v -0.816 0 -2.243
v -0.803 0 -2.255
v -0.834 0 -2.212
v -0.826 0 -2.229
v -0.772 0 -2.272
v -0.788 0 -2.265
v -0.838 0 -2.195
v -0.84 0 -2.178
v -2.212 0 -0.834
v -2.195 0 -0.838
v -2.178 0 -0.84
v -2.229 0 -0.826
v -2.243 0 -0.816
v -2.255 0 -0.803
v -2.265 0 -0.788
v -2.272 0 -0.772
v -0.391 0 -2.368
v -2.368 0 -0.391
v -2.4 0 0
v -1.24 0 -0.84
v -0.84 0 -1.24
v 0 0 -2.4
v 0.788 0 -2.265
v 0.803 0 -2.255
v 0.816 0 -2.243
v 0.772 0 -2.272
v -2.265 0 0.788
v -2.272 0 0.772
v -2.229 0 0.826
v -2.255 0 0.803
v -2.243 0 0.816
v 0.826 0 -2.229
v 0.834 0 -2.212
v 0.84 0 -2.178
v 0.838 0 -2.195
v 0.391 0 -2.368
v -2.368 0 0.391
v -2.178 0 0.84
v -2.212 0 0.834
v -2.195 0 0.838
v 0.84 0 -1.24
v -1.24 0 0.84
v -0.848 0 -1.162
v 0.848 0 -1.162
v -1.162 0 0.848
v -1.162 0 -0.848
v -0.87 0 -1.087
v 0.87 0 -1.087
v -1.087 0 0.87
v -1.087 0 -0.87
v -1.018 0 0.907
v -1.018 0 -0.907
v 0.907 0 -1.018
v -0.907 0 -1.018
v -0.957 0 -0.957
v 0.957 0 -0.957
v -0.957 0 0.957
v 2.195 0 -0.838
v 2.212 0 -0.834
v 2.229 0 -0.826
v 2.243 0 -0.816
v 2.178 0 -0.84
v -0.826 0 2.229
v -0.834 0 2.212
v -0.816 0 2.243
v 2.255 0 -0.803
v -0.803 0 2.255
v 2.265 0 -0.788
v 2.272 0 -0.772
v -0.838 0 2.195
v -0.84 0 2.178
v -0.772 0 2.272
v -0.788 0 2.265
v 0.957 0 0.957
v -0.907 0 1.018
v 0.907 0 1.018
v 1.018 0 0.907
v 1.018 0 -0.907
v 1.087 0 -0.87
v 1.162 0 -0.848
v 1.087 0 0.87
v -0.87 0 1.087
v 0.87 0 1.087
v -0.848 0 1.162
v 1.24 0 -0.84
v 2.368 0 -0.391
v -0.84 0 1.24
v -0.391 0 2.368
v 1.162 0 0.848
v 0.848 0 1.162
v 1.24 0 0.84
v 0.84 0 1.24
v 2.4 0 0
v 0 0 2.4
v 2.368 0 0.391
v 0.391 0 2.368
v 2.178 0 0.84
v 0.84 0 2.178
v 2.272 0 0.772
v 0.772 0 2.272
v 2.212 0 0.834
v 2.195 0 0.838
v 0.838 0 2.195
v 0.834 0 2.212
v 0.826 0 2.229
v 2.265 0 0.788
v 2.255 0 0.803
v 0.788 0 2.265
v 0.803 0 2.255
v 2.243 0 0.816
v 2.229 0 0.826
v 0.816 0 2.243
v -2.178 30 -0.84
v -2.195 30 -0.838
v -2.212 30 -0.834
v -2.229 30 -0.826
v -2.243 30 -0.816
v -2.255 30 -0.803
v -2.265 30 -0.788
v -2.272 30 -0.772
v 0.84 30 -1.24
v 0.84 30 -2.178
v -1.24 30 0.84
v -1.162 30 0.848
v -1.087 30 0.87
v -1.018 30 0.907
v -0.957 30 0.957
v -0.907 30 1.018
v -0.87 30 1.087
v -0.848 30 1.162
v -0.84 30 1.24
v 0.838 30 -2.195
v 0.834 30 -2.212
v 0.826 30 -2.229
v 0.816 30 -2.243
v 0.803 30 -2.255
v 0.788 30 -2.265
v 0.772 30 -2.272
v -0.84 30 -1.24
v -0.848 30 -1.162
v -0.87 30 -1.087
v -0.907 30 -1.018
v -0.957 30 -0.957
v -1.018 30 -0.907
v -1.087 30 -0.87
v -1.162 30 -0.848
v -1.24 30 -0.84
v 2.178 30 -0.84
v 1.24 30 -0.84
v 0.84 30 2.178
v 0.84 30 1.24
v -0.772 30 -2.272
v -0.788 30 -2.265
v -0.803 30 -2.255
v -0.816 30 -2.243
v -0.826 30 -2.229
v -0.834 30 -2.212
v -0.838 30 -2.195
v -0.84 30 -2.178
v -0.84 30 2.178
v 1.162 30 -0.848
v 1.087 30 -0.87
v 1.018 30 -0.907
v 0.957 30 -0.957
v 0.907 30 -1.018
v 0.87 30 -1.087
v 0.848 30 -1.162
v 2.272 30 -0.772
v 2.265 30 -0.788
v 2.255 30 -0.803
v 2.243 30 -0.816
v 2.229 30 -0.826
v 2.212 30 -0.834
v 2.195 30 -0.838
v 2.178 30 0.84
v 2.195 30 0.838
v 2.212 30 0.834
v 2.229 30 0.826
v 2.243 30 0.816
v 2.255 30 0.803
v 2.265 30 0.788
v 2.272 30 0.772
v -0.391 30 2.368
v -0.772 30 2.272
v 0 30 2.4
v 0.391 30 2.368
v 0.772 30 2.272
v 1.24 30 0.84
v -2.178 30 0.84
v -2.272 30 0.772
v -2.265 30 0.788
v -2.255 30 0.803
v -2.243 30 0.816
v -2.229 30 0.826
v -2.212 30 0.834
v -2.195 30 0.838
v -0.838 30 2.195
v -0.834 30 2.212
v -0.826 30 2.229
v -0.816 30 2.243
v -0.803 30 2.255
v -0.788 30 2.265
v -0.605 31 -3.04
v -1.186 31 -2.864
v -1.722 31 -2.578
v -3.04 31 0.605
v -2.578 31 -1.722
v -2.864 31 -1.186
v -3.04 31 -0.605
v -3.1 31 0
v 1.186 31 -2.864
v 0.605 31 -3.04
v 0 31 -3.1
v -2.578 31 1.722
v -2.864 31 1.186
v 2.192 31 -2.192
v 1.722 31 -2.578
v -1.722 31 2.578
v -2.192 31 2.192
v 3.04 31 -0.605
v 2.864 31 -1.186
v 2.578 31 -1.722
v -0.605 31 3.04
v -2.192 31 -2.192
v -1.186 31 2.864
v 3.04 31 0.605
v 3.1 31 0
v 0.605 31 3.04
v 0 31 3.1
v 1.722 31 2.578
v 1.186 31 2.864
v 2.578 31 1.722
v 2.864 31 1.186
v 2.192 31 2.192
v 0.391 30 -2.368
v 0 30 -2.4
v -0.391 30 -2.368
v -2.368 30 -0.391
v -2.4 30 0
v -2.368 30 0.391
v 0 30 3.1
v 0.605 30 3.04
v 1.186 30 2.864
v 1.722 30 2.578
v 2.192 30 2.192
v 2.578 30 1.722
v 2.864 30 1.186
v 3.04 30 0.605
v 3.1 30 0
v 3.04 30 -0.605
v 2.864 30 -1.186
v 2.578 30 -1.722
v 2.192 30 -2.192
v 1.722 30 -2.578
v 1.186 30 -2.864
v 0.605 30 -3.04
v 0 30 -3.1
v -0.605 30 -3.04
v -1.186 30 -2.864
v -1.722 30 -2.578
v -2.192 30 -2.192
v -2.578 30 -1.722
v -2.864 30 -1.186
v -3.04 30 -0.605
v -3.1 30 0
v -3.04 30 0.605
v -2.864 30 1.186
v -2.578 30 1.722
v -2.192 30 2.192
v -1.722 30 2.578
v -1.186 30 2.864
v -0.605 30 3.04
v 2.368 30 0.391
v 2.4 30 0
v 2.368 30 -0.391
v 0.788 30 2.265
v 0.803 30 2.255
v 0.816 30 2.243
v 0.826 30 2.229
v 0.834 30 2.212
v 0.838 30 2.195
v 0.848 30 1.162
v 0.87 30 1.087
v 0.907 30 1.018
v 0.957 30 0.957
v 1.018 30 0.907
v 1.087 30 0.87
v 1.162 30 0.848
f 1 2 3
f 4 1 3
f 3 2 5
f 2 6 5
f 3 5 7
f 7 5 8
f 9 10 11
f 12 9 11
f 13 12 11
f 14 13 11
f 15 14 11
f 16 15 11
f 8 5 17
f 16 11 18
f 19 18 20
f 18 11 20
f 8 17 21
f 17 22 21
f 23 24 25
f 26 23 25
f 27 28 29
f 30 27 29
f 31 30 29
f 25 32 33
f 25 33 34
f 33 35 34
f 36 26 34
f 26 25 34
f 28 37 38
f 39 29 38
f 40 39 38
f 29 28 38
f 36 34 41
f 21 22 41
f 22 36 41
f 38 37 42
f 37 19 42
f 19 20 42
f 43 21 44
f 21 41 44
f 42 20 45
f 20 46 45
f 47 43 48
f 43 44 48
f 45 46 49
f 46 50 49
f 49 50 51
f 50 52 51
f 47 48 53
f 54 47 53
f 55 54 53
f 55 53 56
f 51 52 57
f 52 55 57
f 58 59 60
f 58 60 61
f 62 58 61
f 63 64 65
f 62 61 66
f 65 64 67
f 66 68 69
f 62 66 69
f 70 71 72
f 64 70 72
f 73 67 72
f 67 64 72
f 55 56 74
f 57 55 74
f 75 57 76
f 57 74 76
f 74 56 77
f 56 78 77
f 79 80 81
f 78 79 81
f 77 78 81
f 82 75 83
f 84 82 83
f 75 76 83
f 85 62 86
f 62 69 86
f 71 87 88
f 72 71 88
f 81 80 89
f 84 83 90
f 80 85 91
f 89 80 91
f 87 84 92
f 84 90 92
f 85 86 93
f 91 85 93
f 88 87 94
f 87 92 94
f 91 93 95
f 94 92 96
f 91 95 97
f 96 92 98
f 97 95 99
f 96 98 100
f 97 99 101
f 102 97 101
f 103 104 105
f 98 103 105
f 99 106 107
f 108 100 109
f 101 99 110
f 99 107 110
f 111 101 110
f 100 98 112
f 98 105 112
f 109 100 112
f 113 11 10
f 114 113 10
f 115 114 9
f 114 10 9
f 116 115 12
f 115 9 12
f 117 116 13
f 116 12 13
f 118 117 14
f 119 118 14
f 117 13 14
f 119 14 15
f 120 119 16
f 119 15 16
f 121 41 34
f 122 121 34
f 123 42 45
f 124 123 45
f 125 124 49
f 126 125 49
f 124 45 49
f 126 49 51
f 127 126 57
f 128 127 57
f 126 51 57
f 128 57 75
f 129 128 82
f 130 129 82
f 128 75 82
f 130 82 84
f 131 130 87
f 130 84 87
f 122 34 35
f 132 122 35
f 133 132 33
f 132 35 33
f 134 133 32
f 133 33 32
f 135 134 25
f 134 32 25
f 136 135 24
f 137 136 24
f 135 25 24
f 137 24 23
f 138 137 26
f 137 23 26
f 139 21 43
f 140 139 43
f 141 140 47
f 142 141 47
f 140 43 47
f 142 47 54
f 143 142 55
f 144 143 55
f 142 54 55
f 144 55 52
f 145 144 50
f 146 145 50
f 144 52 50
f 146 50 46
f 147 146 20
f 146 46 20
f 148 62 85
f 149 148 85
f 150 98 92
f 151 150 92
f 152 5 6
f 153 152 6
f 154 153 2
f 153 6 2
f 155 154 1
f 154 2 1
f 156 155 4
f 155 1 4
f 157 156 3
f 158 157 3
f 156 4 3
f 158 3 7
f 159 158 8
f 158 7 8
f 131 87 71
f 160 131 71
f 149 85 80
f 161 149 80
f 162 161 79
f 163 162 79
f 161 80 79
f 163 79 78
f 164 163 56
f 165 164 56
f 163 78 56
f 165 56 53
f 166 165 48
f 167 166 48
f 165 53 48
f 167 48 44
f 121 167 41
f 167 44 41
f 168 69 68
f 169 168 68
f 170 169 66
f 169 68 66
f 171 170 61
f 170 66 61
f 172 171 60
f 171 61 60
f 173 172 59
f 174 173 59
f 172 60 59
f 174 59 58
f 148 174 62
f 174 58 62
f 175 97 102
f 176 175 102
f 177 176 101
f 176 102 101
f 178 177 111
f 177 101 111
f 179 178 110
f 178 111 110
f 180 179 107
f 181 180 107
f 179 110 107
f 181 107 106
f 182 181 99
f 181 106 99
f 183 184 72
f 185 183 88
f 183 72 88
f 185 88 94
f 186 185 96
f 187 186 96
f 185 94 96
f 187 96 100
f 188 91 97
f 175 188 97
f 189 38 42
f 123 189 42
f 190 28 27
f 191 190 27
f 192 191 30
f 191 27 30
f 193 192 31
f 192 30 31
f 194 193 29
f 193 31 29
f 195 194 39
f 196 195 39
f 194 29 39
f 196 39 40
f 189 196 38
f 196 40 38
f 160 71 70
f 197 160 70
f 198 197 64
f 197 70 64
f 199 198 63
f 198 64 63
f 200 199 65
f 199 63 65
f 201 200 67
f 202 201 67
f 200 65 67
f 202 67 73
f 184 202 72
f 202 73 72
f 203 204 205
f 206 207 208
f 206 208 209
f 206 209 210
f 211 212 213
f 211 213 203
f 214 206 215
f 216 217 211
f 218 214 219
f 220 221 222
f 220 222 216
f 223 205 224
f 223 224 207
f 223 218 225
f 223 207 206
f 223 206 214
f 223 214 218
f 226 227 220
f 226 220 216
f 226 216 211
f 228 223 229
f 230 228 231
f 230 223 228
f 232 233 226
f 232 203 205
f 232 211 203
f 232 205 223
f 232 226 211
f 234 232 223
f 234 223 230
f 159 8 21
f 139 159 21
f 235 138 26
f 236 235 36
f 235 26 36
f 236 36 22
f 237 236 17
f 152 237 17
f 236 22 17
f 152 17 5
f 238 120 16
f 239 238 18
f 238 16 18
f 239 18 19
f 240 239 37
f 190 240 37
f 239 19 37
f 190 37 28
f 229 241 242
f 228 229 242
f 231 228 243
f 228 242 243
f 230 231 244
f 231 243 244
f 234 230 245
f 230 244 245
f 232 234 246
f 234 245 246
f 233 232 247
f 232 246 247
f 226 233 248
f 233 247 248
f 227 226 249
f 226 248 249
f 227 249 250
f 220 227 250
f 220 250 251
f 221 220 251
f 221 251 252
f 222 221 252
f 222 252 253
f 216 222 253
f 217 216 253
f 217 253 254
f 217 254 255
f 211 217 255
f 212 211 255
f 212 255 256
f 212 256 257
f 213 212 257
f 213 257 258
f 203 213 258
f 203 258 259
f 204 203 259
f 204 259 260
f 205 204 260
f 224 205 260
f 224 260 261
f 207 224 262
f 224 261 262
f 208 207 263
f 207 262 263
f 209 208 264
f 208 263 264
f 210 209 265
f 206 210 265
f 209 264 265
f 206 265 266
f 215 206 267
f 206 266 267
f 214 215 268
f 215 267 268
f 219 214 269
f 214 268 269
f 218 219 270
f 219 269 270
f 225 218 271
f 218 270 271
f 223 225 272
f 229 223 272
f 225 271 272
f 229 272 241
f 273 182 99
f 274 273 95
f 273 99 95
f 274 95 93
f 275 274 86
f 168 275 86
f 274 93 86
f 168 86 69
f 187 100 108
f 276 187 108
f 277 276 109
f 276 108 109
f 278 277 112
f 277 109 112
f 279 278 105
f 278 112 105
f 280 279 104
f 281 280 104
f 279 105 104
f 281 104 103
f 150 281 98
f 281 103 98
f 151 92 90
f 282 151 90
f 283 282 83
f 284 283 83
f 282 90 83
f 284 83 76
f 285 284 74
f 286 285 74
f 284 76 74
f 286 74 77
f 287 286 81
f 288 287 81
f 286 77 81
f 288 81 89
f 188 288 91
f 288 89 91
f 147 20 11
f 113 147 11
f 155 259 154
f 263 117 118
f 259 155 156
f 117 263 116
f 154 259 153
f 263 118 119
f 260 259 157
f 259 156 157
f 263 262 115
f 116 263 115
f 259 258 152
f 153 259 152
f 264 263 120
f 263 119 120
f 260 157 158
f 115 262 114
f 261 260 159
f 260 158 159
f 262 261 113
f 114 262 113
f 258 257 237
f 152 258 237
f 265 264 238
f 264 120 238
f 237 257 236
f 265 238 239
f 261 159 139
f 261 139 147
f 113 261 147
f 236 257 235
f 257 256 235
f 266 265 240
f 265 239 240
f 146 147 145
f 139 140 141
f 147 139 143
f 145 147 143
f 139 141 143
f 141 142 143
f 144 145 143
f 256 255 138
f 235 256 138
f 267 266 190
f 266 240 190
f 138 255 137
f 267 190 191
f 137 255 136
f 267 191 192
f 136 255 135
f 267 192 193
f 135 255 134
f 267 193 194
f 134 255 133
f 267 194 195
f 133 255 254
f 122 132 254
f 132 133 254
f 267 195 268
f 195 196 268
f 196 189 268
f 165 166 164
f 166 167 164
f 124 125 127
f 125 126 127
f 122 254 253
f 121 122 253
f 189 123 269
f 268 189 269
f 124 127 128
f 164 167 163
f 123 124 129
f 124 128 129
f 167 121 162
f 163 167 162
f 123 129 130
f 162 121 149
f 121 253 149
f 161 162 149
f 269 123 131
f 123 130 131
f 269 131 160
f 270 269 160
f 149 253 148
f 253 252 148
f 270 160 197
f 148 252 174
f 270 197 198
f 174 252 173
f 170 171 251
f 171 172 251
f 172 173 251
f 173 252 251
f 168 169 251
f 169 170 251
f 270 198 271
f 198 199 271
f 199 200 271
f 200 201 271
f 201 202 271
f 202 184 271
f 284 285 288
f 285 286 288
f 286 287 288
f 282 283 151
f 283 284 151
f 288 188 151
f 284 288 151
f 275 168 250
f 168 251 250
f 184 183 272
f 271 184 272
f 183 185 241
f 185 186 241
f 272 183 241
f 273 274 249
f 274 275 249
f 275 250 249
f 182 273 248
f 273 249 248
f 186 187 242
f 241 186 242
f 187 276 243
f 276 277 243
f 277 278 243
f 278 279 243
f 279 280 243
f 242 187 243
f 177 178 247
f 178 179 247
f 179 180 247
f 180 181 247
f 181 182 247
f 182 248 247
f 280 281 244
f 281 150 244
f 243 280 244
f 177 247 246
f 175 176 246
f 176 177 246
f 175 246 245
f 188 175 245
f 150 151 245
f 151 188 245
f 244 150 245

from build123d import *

# Parameters (mm, degrees)
SKETCH2_R           = 3.1
BOSS_EXTRUDE1_DEPTH = 31
SKETCH3_R           = 3.1
CUT_EXTRUDE1_DEPTH  = 30


with BuildPart() as part:
    # Sketch2 → Boss-Extrude1 (new body)
    with BuildSketch(Plane(origin=(0, 0, 0), x_dir=(1, 0, 0), z_dir=(0, 1, 0))):
        with Locations(Location((0, 0, 0), (0, 0, 270))):
            Circle(SKETCH2_R)
    extrude(amount=BOSS_EXTRUDE1_DEPTH)

    # Sketch3 → Cut-Extrude1 (cut)
    with BuildSketch(Plane(origin=(0, 0, 0), x_dir=(1, 0, 0), z_dir=(0, 1, 0))):
        with Locations(Location((0, 0, 0), (0, 0, 270))):
            Circle(SKETCH3_R)
        with BuildLine():
            Line((-0.84, -1.24), (-0.84, -2.177705214))
            ThreePointArc((-0.84, -2.177705214), (-0.821293884, -2.235940121), (-0.772173913, -2.27238805))
            ThreePointArc((-0.772173913, -2.27238805), (0, -2.4), (0.772173913, -2.27238805))
            ThreePointArc((0.772173913, -2.27238805), (0.821293884, -2.235940121), (0.84, -2.177705214))
            Line((0.84, -2.177705214), (0.84, -1.24))
            ThreePointArc((0.84, -1.24), (0.957157288, -0.957157288), (1.24, -0.84))
            Line((1.24, -0.84), (2.177705214, -0.84))
            ThreePointArc((2.177705214, -0.84), (2.235940121, -0.821293884), (2.27238805, -0.772173913))
            ThreePointArc((2.27238805, -0.772173913), (2.4, 0), (2.27238805, 0.772173913))
            ThreePointArc((2.27238805, 0.772173913), (2.235940121, 0.821293884), (2.177705214, 0.84))
            Line((2.177705214, 0.84), (1.24, 0.84))
            ThreePointArc((1.24, 0.84), (0.957157288, 0.957157288), (0.84, 1.24))
            Line((0.84, 1.24), (0.84, 2.177705214))
            ThreePointArc((0.84, 2.177705214), (0.821293884, 2.235940121), (0.772173913, 2.27238805))
            ThreePointArc((0.772173913, 2.27238805), (0, 2.4), (-0.772173913, 2.27238805))
            ThreePointArc((-0.772173913, 2.27238805), (-0.821293884, 2.235940121), (-0.84, 2.177705214))
            Line((-0.84, 2.177705214), (-0.84, 1.24))
            ThreePointArc((-0.84, 1.24), (-0.957157288, 0.957157288), (-1.24, 0.84))
            Line((-1.24, 0.84), (-2.177705214, 0.84))
            ThreePointArc((-2.177705214, 0.84), (-2.235940121, 0.821293884), (-2.27238805, 0.772173913))
            ThreePointArc((-2.27238805, 0.772173913), (-2.4, 0), (-2.27238805, -0.772173913))
            ThreePointArc((-2.27238805, -0.772173913), (-2.235940121, -0.821293884), (-2.177705214, -0.84))
            Line((-2.177705214, -0.84), (-1.24, -0.84))
            ThreePointArc((-1.24, -0.84), (-0.957157288, -0.957157288), (-0.84, -1.24))
        make_face(mode=Mode.SUBTRACT)
    extrude(amount=CUT_EXTRUDE1_DEPTH, mode=Mode.SUBTRACT)


solid = part.part
